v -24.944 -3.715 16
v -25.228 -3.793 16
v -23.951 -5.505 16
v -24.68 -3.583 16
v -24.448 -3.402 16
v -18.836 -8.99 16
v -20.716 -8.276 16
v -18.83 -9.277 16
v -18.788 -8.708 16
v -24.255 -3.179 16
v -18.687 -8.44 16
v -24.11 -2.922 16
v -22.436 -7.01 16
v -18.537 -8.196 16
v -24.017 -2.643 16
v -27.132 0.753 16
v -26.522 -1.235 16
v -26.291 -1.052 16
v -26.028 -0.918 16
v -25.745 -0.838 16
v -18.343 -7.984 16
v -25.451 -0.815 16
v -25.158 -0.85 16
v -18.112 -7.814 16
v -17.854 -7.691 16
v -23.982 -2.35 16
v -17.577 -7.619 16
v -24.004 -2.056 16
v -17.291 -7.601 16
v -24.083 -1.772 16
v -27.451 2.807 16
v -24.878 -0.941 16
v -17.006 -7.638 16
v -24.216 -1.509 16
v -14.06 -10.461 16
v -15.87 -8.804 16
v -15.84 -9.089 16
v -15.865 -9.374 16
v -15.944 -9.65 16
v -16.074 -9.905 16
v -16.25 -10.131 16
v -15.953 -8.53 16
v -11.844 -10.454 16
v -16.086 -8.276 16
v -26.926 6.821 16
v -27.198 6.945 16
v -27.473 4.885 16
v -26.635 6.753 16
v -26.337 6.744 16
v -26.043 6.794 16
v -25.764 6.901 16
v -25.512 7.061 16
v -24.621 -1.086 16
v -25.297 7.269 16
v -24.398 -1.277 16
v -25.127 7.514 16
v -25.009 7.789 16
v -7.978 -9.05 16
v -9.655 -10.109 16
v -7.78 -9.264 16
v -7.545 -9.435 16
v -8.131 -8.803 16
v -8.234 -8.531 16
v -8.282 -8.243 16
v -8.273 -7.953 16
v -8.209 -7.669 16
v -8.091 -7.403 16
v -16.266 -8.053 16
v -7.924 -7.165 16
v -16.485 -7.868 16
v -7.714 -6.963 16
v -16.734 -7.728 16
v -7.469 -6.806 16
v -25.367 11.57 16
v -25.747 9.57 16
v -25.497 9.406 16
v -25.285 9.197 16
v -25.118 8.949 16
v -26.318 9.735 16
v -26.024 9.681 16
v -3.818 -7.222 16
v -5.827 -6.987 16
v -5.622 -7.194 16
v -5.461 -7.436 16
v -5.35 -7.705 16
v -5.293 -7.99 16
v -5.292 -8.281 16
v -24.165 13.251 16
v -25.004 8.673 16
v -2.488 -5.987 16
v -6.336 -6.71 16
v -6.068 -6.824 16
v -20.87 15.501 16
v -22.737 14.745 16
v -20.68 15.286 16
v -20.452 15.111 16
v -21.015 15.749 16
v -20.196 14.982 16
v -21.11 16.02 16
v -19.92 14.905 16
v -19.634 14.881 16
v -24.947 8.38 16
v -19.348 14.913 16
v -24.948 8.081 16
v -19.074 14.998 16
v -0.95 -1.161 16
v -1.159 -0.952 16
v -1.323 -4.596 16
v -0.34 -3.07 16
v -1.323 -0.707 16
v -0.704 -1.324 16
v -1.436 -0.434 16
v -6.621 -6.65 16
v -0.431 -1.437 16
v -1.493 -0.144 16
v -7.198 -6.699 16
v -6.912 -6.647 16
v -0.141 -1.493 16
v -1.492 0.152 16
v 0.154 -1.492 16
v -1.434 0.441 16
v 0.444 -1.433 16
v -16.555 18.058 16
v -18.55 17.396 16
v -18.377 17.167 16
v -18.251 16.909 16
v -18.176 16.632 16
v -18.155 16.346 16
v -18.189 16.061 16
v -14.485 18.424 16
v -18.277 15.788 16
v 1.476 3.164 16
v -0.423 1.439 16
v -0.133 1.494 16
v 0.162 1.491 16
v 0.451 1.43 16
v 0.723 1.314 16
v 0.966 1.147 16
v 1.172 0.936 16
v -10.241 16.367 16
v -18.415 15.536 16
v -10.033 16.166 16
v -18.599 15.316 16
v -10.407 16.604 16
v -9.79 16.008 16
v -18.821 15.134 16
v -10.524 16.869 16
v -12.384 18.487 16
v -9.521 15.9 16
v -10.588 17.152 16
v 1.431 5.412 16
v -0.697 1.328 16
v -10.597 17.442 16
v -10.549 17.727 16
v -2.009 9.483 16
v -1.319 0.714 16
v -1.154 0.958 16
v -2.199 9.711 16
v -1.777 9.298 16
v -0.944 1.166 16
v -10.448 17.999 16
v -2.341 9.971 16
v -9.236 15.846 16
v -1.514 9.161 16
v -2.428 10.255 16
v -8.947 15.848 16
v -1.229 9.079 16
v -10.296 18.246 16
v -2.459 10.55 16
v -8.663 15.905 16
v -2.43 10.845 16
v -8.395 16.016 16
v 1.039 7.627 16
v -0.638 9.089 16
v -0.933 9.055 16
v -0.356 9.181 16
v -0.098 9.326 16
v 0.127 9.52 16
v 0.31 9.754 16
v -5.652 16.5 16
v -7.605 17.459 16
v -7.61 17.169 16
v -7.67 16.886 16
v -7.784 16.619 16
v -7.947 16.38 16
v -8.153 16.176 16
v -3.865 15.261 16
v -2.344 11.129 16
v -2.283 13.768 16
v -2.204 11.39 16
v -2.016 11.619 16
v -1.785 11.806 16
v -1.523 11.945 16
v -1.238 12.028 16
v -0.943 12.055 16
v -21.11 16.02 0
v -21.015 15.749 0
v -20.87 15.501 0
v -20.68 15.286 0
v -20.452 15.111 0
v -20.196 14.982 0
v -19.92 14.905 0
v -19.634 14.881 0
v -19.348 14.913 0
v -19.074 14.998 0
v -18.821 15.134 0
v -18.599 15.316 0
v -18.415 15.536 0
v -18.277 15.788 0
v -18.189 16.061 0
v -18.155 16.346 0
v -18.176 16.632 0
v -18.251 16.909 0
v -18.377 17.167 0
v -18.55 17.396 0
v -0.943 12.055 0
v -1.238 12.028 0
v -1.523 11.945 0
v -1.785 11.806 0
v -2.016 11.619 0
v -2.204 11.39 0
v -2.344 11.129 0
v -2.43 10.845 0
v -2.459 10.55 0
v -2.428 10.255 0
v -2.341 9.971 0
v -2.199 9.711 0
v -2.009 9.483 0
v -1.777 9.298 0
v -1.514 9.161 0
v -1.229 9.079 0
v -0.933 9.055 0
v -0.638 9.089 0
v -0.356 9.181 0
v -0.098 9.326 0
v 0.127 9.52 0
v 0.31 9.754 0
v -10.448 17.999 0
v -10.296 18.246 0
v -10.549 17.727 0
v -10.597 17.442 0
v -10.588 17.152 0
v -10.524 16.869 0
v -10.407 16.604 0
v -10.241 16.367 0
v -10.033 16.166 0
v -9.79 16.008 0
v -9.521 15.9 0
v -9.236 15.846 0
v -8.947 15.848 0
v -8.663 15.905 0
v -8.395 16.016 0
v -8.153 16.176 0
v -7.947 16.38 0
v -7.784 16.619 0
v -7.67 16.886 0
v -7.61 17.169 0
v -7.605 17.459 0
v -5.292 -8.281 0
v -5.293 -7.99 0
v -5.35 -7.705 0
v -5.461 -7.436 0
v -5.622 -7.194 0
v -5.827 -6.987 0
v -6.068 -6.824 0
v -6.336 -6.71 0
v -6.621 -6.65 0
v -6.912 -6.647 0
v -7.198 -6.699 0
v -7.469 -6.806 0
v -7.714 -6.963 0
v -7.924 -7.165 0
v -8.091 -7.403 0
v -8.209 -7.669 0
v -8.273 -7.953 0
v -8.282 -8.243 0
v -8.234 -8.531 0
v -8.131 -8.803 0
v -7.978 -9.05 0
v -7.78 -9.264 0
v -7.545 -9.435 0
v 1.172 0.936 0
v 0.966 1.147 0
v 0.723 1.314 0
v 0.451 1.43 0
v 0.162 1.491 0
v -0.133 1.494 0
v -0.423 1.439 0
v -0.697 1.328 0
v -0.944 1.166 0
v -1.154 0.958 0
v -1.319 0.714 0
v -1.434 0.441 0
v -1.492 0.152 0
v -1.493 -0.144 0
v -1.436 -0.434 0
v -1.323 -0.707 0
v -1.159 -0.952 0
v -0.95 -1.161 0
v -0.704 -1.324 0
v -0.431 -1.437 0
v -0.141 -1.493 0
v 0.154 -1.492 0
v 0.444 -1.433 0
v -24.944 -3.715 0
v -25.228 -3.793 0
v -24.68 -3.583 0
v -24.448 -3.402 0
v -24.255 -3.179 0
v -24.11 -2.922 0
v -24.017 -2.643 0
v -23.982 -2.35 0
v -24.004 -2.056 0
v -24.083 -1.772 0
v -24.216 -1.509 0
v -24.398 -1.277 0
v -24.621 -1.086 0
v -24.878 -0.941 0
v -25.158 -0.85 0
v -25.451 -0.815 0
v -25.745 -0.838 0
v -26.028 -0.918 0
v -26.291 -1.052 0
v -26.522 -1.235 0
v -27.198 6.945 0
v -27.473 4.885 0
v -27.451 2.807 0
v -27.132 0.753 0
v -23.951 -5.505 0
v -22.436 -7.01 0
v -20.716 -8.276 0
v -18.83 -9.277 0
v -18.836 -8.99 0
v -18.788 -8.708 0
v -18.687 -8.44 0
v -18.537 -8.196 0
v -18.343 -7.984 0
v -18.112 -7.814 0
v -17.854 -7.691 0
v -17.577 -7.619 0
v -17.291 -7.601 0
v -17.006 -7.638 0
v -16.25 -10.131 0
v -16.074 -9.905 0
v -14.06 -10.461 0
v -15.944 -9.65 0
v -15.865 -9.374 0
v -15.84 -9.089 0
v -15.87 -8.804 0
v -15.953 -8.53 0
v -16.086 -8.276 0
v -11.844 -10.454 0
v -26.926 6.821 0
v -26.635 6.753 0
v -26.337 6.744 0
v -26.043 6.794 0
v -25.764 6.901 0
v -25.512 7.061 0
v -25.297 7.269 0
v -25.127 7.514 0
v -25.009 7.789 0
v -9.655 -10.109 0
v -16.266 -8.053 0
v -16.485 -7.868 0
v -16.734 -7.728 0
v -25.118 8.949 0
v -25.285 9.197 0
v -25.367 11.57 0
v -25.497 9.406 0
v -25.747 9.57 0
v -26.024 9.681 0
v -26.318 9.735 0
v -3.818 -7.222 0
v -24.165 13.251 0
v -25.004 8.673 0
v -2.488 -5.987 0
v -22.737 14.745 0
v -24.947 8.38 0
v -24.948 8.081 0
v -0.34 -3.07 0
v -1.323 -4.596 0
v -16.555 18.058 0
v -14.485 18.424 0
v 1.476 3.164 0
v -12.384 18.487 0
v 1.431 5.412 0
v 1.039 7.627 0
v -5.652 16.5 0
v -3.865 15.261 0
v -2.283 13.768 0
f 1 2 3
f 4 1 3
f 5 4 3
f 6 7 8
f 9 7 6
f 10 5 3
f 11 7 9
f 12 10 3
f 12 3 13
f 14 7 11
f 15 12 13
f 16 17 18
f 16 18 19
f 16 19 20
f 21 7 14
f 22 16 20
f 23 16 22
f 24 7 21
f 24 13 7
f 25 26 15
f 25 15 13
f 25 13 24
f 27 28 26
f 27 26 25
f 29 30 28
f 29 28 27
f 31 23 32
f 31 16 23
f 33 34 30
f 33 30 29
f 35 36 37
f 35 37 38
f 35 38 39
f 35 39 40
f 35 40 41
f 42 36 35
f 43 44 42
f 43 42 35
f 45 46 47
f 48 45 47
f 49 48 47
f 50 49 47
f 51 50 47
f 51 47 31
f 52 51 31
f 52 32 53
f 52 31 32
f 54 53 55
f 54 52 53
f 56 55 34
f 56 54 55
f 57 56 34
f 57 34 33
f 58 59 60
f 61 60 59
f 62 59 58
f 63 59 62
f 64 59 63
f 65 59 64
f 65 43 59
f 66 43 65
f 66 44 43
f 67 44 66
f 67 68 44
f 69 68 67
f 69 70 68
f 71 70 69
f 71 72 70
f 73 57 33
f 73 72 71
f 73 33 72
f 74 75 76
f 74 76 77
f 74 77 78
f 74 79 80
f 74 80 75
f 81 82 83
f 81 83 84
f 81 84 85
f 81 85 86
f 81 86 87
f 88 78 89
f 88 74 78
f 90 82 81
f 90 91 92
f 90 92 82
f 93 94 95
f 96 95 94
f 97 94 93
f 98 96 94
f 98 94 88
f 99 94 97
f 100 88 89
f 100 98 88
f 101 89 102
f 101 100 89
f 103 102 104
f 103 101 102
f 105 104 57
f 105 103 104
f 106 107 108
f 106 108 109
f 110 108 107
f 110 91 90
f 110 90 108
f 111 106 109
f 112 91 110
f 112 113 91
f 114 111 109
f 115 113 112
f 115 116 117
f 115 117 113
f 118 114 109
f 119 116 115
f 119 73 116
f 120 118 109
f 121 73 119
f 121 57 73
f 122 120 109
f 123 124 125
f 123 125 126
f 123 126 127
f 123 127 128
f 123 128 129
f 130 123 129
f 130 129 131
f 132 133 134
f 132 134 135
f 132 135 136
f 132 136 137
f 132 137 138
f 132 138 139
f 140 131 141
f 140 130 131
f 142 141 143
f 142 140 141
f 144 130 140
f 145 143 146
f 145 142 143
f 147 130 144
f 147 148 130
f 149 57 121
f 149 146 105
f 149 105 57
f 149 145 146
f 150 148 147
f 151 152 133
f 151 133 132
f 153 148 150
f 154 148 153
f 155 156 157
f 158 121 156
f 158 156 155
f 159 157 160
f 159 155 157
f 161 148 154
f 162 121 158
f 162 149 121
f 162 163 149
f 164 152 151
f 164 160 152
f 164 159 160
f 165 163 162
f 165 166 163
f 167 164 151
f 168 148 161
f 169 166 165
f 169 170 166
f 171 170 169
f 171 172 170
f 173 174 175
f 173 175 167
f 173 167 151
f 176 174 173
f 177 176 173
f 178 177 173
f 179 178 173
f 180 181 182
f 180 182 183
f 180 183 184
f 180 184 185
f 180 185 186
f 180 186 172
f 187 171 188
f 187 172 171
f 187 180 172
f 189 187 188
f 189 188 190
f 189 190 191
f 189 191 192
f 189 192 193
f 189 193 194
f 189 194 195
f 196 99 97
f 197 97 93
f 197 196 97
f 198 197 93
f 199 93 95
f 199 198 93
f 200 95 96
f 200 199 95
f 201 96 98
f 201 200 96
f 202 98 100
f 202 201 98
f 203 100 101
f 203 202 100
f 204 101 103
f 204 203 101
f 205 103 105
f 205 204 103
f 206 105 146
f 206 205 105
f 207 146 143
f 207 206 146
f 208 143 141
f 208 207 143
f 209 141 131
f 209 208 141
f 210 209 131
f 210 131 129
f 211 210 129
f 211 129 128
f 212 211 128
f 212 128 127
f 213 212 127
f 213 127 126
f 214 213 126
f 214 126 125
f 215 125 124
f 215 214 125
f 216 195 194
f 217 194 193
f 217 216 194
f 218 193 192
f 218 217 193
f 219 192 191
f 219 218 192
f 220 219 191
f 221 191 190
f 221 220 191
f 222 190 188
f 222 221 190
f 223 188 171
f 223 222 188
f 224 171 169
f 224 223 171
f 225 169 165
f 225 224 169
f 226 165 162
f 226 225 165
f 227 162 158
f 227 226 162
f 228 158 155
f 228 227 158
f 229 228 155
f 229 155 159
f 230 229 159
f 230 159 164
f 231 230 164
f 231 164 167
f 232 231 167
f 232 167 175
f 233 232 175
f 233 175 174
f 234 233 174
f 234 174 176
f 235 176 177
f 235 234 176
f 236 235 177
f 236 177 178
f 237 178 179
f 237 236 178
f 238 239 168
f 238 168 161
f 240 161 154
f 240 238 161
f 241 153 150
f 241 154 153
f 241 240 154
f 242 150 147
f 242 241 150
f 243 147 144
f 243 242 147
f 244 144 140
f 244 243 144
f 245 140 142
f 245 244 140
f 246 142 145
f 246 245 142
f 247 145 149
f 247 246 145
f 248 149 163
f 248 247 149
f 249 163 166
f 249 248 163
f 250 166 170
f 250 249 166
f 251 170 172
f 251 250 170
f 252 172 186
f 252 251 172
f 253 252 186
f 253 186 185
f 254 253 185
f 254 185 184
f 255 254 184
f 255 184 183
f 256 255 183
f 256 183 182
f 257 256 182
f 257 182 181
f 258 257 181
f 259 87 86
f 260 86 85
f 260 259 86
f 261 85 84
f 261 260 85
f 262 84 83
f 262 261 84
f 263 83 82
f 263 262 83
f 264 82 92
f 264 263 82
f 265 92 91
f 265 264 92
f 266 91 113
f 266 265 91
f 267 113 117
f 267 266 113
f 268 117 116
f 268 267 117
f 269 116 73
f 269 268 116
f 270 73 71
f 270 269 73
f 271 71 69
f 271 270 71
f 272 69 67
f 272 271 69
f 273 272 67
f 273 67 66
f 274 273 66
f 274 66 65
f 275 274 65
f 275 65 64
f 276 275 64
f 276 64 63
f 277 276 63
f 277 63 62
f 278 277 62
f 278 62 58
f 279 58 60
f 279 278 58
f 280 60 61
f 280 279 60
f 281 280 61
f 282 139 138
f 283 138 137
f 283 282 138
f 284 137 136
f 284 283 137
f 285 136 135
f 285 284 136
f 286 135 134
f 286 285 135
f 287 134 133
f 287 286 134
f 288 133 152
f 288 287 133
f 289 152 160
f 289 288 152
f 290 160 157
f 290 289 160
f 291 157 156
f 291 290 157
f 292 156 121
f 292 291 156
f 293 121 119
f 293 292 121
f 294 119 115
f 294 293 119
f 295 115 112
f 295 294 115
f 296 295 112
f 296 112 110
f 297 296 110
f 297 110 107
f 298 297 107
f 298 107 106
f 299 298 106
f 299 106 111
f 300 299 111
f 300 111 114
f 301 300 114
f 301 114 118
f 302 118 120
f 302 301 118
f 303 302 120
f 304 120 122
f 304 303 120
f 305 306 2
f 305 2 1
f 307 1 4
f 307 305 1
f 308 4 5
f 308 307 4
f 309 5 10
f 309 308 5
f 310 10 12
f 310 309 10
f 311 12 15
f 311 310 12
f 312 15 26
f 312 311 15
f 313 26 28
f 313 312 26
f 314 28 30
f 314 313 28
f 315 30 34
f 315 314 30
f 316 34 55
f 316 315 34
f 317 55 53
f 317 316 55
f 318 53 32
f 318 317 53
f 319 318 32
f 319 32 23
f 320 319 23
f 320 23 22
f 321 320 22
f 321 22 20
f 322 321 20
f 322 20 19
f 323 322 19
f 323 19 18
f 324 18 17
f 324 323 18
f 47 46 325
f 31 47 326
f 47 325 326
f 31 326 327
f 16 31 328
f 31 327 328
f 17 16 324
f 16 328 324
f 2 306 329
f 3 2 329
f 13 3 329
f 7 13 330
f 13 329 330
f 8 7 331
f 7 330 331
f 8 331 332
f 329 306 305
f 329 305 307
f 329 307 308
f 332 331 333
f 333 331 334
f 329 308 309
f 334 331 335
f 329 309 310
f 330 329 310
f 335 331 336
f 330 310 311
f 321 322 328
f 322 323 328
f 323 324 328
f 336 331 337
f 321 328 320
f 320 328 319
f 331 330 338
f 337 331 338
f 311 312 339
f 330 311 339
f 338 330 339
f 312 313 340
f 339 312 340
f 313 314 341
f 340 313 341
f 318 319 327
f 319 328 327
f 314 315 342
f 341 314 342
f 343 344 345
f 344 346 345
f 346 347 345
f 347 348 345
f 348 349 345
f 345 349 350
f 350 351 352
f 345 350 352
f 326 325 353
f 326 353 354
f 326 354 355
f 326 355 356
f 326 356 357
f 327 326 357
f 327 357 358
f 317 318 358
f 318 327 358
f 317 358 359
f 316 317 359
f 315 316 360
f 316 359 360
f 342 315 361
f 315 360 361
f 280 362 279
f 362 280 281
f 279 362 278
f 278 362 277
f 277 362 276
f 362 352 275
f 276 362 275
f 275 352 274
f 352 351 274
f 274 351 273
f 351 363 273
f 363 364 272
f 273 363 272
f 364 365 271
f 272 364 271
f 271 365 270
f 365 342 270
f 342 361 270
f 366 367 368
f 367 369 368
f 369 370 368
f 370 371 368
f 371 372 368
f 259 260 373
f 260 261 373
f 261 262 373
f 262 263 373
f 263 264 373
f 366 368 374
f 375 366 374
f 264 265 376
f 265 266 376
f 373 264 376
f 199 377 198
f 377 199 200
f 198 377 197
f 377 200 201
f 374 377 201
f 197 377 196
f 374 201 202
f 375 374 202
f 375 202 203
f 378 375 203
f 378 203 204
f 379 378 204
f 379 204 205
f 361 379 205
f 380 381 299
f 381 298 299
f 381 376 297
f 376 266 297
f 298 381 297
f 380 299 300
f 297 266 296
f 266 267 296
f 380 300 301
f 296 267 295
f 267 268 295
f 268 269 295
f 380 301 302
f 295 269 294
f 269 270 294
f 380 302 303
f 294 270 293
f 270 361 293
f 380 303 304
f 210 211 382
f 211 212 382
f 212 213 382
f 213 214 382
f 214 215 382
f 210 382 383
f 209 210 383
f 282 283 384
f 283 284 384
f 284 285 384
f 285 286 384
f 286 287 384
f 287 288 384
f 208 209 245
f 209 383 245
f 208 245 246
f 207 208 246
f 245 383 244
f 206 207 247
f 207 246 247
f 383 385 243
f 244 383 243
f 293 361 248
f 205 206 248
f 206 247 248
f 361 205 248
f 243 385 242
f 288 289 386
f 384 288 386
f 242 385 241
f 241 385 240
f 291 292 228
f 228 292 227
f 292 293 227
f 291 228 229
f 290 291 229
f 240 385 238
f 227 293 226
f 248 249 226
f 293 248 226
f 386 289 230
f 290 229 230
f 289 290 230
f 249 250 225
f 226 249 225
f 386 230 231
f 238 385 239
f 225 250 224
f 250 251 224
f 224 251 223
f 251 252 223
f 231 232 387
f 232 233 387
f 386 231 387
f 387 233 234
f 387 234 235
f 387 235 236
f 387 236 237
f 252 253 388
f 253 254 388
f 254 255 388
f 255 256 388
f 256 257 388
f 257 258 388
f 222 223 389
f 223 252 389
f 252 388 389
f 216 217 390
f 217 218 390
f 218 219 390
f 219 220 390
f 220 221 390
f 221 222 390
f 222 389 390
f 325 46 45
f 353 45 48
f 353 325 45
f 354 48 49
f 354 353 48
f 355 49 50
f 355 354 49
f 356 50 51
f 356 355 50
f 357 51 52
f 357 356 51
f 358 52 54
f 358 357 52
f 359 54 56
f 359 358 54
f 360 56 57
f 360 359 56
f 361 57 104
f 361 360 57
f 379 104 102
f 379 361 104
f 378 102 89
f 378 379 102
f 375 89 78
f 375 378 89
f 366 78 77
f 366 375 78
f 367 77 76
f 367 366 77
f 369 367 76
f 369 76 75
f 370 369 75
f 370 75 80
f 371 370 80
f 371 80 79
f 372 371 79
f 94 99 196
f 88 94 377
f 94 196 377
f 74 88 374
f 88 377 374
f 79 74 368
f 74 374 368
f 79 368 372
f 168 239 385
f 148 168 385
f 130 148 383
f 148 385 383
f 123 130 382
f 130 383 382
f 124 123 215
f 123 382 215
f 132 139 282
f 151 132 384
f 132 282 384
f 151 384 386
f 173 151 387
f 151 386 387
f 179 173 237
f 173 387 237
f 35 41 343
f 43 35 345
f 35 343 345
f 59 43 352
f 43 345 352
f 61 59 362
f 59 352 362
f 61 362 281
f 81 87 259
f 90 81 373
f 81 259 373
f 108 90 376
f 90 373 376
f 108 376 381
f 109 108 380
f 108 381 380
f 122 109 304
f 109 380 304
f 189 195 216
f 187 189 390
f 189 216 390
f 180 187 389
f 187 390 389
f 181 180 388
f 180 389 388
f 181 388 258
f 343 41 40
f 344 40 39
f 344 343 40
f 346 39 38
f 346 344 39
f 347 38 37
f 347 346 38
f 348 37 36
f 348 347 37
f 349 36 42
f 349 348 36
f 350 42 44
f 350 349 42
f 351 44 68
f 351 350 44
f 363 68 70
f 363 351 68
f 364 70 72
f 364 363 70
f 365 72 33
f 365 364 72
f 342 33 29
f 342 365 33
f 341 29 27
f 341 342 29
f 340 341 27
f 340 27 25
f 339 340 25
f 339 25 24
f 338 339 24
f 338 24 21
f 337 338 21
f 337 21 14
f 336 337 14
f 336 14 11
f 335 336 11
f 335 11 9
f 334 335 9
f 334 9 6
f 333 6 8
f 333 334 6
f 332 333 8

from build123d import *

# Parameters (mm, degrees)
CYLINDER_R        = 1.5
CYLINDER_DEPTH    = 18
ARRAY_COUNT       = 8
CYLINDER001_R     = 14.5
CYLINDER001_DEPTH = 16


with BuildPart() as array:
    # Cylinder → Cylinder (new body)
    with BuildSketch(Plane.XY):
        Circle(CYLINDER_R)
    extrude(amount=CYLINDER_DEPTH)

    # Array: Array ×8 about axis
    array_axis = Axis((-13.22, 4.12, 0), (0, 0, 1))


with BuildPart() as array_1:
    add(array.part)
    for i in range(1, ARRAY_COUNT):
        add(array.part.rotate(array_axis, i * 360 / ARRAY_COUNT))


with BuildPart() as cut:
    # Cylinder001 → Cylinder001 (new body)
    with BuildSketch(Plane(origin=(-13, 4, 0), x_dir=(1, 0, 0), z_dir=(0, 0, 1))):
        Circle(CYLINDER001_R)
    extrude(amount=CYLINDER001_DEPTH)

    # Cut: cut Array
    add(array_1.part, mode=Mode.SUBTRACT)


solid = cut.part
